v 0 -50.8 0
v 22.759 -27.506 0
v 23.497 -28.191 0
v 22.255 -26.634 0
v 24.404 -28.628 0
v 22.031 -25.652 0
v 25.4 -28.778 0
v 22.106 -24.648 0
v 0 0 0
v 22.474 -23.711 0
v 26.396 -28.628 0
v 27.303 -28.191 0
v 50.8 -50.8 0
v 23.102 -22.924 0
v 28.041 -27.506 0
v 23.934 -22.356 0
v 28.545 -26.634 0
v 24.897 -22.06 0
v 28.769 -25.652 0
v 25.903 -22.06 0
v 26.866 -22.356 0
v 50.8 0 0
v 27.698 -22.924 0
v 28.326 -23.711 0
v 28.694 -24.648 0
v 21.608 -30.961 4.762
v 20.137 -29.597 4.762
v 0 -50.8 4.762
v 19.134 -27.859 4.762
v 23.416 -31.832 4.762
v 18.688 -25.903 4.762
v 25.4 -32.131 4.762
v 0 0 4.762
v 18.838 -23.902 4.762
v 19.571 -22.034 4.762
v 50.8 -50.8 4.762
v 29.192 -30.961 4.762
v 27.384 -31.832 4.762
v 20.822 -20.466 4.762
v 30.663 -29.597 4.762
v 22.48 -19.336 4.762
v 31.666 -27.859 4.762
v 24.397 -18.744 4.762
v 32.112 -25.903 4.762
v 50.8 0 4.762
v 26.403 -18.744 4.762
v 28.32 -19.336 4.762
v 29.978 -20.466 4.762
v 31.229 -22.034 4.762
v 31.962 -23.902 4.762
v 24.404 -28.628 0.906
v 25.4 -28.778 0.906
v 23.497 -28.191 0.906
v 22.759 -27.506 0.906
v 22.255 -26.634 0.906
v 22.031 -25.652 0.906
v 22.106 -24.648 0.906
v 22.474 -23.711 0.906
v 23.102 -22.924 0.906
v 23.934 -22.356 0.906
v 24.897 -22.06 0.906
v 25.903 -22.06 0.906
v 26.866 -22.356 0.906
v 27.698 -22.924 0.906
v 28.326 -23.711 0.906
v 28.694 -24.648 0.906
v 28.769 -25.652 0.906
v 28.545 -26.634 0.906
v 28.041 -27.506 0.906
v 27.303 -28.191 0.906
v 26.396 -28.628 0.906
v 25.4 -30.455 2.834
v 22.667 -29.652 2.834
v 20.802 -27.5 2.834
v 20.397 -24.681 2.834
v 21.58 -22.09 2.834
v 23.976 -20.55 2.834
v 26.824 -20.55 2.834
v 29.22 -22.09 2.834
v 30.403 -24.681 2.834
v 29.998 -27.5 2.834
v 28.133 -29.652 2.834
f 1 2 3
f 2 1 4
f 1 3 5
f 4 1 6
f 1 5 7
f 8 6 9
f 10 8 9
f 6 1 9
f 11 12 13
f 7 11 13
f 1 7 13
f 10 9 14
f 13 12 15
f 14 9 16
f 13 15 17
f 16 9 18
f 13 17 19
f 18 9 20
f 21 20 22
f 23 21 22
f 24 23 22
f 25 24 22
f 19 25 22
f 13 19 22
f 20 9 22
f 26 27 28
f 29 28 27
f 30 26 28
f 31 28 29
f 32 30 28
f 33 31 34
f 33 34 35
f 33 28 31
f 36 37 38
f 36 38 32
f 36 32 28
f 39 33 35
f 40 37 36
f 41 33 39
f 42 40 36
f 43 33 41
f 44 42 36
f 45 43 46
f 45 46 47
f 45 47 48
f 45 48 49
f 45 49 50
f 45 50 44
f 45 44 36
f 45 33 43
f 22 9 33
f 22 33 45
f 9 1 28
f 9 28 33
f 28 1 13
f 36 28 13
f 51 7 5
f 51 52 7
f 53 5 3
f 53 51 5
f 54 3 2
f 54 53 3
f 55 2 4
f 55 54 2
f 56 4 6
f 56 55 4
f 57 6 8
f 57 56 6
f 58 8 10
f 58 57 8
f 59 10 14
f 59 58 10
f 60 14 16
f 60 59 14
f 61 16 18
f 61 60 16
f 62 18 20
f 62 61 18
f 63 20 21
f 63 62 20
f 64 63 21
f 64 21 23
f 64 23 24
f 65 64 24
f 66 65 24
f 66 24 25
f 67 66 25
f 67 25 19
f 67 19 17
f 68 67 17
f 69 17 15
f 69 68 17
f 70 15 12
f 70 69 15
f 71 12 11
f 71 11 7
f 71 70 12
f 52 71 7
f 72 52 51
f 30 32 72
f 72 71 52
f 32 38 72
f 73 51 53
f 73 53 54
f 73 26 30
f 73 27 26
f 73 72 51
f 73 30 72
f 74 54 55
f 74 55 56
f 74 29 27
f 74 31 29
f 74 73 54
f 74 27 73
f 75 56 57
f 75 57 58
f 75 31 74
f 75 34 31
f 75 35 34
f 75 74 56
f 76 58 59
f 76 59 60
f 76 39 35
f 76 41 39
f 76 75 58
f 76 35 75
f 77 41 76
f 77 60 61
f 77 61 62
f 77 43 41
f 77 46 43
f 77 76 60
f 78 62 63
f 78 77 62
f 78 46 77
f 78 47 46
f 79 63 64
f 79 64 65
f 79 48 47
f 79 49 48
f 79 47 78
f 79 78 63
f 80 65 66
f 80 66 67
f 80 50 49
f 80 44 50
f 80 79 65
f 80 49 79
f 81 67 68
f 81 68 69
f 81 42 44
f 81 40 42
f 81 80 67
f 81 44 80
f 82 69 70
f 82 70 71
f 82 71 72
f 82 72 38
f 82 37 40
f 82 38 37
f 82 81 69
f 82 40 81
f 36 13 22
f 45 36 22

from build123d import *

# Parameters (mm, degrees)
SKETCH1_W           = 50.8
SKETCH1_H           = 50.8
BOSS_EXTRUDE1_DEPTH = 4.7625


with BuildPart() as part:
    # Sketch1 → Boss-Extrude1 (new body)
    with BuildSketch(Plane.XY):
        with Locations((25.4, -25.4)):
            Rectangle(SKETCH1_W, SKETCH1_H)
    extrude(amount=BOSS_EXTRUDE1_DEPTH)

    # Sketch4 → CSK for 1/4 Flat Head Machine Screw (100)1 (revolve, cut)
    with BuildSketch(Plane(origin=(25.4, -25.4, 4.7625), x_dir=(0, -1, 0), z_dir=(1, 0, 0))):
        Polygon((0, 0), (0, 4.7625), (3.3782, 4.7625), (3.3782, 3.856955196), (6.731, 0), align=None)
    revolve(axis=Axis((25.4, -25.4, 11.1125), (0, 0, -1)), mode=Mode.SUBTRACT)


solid = part.part
